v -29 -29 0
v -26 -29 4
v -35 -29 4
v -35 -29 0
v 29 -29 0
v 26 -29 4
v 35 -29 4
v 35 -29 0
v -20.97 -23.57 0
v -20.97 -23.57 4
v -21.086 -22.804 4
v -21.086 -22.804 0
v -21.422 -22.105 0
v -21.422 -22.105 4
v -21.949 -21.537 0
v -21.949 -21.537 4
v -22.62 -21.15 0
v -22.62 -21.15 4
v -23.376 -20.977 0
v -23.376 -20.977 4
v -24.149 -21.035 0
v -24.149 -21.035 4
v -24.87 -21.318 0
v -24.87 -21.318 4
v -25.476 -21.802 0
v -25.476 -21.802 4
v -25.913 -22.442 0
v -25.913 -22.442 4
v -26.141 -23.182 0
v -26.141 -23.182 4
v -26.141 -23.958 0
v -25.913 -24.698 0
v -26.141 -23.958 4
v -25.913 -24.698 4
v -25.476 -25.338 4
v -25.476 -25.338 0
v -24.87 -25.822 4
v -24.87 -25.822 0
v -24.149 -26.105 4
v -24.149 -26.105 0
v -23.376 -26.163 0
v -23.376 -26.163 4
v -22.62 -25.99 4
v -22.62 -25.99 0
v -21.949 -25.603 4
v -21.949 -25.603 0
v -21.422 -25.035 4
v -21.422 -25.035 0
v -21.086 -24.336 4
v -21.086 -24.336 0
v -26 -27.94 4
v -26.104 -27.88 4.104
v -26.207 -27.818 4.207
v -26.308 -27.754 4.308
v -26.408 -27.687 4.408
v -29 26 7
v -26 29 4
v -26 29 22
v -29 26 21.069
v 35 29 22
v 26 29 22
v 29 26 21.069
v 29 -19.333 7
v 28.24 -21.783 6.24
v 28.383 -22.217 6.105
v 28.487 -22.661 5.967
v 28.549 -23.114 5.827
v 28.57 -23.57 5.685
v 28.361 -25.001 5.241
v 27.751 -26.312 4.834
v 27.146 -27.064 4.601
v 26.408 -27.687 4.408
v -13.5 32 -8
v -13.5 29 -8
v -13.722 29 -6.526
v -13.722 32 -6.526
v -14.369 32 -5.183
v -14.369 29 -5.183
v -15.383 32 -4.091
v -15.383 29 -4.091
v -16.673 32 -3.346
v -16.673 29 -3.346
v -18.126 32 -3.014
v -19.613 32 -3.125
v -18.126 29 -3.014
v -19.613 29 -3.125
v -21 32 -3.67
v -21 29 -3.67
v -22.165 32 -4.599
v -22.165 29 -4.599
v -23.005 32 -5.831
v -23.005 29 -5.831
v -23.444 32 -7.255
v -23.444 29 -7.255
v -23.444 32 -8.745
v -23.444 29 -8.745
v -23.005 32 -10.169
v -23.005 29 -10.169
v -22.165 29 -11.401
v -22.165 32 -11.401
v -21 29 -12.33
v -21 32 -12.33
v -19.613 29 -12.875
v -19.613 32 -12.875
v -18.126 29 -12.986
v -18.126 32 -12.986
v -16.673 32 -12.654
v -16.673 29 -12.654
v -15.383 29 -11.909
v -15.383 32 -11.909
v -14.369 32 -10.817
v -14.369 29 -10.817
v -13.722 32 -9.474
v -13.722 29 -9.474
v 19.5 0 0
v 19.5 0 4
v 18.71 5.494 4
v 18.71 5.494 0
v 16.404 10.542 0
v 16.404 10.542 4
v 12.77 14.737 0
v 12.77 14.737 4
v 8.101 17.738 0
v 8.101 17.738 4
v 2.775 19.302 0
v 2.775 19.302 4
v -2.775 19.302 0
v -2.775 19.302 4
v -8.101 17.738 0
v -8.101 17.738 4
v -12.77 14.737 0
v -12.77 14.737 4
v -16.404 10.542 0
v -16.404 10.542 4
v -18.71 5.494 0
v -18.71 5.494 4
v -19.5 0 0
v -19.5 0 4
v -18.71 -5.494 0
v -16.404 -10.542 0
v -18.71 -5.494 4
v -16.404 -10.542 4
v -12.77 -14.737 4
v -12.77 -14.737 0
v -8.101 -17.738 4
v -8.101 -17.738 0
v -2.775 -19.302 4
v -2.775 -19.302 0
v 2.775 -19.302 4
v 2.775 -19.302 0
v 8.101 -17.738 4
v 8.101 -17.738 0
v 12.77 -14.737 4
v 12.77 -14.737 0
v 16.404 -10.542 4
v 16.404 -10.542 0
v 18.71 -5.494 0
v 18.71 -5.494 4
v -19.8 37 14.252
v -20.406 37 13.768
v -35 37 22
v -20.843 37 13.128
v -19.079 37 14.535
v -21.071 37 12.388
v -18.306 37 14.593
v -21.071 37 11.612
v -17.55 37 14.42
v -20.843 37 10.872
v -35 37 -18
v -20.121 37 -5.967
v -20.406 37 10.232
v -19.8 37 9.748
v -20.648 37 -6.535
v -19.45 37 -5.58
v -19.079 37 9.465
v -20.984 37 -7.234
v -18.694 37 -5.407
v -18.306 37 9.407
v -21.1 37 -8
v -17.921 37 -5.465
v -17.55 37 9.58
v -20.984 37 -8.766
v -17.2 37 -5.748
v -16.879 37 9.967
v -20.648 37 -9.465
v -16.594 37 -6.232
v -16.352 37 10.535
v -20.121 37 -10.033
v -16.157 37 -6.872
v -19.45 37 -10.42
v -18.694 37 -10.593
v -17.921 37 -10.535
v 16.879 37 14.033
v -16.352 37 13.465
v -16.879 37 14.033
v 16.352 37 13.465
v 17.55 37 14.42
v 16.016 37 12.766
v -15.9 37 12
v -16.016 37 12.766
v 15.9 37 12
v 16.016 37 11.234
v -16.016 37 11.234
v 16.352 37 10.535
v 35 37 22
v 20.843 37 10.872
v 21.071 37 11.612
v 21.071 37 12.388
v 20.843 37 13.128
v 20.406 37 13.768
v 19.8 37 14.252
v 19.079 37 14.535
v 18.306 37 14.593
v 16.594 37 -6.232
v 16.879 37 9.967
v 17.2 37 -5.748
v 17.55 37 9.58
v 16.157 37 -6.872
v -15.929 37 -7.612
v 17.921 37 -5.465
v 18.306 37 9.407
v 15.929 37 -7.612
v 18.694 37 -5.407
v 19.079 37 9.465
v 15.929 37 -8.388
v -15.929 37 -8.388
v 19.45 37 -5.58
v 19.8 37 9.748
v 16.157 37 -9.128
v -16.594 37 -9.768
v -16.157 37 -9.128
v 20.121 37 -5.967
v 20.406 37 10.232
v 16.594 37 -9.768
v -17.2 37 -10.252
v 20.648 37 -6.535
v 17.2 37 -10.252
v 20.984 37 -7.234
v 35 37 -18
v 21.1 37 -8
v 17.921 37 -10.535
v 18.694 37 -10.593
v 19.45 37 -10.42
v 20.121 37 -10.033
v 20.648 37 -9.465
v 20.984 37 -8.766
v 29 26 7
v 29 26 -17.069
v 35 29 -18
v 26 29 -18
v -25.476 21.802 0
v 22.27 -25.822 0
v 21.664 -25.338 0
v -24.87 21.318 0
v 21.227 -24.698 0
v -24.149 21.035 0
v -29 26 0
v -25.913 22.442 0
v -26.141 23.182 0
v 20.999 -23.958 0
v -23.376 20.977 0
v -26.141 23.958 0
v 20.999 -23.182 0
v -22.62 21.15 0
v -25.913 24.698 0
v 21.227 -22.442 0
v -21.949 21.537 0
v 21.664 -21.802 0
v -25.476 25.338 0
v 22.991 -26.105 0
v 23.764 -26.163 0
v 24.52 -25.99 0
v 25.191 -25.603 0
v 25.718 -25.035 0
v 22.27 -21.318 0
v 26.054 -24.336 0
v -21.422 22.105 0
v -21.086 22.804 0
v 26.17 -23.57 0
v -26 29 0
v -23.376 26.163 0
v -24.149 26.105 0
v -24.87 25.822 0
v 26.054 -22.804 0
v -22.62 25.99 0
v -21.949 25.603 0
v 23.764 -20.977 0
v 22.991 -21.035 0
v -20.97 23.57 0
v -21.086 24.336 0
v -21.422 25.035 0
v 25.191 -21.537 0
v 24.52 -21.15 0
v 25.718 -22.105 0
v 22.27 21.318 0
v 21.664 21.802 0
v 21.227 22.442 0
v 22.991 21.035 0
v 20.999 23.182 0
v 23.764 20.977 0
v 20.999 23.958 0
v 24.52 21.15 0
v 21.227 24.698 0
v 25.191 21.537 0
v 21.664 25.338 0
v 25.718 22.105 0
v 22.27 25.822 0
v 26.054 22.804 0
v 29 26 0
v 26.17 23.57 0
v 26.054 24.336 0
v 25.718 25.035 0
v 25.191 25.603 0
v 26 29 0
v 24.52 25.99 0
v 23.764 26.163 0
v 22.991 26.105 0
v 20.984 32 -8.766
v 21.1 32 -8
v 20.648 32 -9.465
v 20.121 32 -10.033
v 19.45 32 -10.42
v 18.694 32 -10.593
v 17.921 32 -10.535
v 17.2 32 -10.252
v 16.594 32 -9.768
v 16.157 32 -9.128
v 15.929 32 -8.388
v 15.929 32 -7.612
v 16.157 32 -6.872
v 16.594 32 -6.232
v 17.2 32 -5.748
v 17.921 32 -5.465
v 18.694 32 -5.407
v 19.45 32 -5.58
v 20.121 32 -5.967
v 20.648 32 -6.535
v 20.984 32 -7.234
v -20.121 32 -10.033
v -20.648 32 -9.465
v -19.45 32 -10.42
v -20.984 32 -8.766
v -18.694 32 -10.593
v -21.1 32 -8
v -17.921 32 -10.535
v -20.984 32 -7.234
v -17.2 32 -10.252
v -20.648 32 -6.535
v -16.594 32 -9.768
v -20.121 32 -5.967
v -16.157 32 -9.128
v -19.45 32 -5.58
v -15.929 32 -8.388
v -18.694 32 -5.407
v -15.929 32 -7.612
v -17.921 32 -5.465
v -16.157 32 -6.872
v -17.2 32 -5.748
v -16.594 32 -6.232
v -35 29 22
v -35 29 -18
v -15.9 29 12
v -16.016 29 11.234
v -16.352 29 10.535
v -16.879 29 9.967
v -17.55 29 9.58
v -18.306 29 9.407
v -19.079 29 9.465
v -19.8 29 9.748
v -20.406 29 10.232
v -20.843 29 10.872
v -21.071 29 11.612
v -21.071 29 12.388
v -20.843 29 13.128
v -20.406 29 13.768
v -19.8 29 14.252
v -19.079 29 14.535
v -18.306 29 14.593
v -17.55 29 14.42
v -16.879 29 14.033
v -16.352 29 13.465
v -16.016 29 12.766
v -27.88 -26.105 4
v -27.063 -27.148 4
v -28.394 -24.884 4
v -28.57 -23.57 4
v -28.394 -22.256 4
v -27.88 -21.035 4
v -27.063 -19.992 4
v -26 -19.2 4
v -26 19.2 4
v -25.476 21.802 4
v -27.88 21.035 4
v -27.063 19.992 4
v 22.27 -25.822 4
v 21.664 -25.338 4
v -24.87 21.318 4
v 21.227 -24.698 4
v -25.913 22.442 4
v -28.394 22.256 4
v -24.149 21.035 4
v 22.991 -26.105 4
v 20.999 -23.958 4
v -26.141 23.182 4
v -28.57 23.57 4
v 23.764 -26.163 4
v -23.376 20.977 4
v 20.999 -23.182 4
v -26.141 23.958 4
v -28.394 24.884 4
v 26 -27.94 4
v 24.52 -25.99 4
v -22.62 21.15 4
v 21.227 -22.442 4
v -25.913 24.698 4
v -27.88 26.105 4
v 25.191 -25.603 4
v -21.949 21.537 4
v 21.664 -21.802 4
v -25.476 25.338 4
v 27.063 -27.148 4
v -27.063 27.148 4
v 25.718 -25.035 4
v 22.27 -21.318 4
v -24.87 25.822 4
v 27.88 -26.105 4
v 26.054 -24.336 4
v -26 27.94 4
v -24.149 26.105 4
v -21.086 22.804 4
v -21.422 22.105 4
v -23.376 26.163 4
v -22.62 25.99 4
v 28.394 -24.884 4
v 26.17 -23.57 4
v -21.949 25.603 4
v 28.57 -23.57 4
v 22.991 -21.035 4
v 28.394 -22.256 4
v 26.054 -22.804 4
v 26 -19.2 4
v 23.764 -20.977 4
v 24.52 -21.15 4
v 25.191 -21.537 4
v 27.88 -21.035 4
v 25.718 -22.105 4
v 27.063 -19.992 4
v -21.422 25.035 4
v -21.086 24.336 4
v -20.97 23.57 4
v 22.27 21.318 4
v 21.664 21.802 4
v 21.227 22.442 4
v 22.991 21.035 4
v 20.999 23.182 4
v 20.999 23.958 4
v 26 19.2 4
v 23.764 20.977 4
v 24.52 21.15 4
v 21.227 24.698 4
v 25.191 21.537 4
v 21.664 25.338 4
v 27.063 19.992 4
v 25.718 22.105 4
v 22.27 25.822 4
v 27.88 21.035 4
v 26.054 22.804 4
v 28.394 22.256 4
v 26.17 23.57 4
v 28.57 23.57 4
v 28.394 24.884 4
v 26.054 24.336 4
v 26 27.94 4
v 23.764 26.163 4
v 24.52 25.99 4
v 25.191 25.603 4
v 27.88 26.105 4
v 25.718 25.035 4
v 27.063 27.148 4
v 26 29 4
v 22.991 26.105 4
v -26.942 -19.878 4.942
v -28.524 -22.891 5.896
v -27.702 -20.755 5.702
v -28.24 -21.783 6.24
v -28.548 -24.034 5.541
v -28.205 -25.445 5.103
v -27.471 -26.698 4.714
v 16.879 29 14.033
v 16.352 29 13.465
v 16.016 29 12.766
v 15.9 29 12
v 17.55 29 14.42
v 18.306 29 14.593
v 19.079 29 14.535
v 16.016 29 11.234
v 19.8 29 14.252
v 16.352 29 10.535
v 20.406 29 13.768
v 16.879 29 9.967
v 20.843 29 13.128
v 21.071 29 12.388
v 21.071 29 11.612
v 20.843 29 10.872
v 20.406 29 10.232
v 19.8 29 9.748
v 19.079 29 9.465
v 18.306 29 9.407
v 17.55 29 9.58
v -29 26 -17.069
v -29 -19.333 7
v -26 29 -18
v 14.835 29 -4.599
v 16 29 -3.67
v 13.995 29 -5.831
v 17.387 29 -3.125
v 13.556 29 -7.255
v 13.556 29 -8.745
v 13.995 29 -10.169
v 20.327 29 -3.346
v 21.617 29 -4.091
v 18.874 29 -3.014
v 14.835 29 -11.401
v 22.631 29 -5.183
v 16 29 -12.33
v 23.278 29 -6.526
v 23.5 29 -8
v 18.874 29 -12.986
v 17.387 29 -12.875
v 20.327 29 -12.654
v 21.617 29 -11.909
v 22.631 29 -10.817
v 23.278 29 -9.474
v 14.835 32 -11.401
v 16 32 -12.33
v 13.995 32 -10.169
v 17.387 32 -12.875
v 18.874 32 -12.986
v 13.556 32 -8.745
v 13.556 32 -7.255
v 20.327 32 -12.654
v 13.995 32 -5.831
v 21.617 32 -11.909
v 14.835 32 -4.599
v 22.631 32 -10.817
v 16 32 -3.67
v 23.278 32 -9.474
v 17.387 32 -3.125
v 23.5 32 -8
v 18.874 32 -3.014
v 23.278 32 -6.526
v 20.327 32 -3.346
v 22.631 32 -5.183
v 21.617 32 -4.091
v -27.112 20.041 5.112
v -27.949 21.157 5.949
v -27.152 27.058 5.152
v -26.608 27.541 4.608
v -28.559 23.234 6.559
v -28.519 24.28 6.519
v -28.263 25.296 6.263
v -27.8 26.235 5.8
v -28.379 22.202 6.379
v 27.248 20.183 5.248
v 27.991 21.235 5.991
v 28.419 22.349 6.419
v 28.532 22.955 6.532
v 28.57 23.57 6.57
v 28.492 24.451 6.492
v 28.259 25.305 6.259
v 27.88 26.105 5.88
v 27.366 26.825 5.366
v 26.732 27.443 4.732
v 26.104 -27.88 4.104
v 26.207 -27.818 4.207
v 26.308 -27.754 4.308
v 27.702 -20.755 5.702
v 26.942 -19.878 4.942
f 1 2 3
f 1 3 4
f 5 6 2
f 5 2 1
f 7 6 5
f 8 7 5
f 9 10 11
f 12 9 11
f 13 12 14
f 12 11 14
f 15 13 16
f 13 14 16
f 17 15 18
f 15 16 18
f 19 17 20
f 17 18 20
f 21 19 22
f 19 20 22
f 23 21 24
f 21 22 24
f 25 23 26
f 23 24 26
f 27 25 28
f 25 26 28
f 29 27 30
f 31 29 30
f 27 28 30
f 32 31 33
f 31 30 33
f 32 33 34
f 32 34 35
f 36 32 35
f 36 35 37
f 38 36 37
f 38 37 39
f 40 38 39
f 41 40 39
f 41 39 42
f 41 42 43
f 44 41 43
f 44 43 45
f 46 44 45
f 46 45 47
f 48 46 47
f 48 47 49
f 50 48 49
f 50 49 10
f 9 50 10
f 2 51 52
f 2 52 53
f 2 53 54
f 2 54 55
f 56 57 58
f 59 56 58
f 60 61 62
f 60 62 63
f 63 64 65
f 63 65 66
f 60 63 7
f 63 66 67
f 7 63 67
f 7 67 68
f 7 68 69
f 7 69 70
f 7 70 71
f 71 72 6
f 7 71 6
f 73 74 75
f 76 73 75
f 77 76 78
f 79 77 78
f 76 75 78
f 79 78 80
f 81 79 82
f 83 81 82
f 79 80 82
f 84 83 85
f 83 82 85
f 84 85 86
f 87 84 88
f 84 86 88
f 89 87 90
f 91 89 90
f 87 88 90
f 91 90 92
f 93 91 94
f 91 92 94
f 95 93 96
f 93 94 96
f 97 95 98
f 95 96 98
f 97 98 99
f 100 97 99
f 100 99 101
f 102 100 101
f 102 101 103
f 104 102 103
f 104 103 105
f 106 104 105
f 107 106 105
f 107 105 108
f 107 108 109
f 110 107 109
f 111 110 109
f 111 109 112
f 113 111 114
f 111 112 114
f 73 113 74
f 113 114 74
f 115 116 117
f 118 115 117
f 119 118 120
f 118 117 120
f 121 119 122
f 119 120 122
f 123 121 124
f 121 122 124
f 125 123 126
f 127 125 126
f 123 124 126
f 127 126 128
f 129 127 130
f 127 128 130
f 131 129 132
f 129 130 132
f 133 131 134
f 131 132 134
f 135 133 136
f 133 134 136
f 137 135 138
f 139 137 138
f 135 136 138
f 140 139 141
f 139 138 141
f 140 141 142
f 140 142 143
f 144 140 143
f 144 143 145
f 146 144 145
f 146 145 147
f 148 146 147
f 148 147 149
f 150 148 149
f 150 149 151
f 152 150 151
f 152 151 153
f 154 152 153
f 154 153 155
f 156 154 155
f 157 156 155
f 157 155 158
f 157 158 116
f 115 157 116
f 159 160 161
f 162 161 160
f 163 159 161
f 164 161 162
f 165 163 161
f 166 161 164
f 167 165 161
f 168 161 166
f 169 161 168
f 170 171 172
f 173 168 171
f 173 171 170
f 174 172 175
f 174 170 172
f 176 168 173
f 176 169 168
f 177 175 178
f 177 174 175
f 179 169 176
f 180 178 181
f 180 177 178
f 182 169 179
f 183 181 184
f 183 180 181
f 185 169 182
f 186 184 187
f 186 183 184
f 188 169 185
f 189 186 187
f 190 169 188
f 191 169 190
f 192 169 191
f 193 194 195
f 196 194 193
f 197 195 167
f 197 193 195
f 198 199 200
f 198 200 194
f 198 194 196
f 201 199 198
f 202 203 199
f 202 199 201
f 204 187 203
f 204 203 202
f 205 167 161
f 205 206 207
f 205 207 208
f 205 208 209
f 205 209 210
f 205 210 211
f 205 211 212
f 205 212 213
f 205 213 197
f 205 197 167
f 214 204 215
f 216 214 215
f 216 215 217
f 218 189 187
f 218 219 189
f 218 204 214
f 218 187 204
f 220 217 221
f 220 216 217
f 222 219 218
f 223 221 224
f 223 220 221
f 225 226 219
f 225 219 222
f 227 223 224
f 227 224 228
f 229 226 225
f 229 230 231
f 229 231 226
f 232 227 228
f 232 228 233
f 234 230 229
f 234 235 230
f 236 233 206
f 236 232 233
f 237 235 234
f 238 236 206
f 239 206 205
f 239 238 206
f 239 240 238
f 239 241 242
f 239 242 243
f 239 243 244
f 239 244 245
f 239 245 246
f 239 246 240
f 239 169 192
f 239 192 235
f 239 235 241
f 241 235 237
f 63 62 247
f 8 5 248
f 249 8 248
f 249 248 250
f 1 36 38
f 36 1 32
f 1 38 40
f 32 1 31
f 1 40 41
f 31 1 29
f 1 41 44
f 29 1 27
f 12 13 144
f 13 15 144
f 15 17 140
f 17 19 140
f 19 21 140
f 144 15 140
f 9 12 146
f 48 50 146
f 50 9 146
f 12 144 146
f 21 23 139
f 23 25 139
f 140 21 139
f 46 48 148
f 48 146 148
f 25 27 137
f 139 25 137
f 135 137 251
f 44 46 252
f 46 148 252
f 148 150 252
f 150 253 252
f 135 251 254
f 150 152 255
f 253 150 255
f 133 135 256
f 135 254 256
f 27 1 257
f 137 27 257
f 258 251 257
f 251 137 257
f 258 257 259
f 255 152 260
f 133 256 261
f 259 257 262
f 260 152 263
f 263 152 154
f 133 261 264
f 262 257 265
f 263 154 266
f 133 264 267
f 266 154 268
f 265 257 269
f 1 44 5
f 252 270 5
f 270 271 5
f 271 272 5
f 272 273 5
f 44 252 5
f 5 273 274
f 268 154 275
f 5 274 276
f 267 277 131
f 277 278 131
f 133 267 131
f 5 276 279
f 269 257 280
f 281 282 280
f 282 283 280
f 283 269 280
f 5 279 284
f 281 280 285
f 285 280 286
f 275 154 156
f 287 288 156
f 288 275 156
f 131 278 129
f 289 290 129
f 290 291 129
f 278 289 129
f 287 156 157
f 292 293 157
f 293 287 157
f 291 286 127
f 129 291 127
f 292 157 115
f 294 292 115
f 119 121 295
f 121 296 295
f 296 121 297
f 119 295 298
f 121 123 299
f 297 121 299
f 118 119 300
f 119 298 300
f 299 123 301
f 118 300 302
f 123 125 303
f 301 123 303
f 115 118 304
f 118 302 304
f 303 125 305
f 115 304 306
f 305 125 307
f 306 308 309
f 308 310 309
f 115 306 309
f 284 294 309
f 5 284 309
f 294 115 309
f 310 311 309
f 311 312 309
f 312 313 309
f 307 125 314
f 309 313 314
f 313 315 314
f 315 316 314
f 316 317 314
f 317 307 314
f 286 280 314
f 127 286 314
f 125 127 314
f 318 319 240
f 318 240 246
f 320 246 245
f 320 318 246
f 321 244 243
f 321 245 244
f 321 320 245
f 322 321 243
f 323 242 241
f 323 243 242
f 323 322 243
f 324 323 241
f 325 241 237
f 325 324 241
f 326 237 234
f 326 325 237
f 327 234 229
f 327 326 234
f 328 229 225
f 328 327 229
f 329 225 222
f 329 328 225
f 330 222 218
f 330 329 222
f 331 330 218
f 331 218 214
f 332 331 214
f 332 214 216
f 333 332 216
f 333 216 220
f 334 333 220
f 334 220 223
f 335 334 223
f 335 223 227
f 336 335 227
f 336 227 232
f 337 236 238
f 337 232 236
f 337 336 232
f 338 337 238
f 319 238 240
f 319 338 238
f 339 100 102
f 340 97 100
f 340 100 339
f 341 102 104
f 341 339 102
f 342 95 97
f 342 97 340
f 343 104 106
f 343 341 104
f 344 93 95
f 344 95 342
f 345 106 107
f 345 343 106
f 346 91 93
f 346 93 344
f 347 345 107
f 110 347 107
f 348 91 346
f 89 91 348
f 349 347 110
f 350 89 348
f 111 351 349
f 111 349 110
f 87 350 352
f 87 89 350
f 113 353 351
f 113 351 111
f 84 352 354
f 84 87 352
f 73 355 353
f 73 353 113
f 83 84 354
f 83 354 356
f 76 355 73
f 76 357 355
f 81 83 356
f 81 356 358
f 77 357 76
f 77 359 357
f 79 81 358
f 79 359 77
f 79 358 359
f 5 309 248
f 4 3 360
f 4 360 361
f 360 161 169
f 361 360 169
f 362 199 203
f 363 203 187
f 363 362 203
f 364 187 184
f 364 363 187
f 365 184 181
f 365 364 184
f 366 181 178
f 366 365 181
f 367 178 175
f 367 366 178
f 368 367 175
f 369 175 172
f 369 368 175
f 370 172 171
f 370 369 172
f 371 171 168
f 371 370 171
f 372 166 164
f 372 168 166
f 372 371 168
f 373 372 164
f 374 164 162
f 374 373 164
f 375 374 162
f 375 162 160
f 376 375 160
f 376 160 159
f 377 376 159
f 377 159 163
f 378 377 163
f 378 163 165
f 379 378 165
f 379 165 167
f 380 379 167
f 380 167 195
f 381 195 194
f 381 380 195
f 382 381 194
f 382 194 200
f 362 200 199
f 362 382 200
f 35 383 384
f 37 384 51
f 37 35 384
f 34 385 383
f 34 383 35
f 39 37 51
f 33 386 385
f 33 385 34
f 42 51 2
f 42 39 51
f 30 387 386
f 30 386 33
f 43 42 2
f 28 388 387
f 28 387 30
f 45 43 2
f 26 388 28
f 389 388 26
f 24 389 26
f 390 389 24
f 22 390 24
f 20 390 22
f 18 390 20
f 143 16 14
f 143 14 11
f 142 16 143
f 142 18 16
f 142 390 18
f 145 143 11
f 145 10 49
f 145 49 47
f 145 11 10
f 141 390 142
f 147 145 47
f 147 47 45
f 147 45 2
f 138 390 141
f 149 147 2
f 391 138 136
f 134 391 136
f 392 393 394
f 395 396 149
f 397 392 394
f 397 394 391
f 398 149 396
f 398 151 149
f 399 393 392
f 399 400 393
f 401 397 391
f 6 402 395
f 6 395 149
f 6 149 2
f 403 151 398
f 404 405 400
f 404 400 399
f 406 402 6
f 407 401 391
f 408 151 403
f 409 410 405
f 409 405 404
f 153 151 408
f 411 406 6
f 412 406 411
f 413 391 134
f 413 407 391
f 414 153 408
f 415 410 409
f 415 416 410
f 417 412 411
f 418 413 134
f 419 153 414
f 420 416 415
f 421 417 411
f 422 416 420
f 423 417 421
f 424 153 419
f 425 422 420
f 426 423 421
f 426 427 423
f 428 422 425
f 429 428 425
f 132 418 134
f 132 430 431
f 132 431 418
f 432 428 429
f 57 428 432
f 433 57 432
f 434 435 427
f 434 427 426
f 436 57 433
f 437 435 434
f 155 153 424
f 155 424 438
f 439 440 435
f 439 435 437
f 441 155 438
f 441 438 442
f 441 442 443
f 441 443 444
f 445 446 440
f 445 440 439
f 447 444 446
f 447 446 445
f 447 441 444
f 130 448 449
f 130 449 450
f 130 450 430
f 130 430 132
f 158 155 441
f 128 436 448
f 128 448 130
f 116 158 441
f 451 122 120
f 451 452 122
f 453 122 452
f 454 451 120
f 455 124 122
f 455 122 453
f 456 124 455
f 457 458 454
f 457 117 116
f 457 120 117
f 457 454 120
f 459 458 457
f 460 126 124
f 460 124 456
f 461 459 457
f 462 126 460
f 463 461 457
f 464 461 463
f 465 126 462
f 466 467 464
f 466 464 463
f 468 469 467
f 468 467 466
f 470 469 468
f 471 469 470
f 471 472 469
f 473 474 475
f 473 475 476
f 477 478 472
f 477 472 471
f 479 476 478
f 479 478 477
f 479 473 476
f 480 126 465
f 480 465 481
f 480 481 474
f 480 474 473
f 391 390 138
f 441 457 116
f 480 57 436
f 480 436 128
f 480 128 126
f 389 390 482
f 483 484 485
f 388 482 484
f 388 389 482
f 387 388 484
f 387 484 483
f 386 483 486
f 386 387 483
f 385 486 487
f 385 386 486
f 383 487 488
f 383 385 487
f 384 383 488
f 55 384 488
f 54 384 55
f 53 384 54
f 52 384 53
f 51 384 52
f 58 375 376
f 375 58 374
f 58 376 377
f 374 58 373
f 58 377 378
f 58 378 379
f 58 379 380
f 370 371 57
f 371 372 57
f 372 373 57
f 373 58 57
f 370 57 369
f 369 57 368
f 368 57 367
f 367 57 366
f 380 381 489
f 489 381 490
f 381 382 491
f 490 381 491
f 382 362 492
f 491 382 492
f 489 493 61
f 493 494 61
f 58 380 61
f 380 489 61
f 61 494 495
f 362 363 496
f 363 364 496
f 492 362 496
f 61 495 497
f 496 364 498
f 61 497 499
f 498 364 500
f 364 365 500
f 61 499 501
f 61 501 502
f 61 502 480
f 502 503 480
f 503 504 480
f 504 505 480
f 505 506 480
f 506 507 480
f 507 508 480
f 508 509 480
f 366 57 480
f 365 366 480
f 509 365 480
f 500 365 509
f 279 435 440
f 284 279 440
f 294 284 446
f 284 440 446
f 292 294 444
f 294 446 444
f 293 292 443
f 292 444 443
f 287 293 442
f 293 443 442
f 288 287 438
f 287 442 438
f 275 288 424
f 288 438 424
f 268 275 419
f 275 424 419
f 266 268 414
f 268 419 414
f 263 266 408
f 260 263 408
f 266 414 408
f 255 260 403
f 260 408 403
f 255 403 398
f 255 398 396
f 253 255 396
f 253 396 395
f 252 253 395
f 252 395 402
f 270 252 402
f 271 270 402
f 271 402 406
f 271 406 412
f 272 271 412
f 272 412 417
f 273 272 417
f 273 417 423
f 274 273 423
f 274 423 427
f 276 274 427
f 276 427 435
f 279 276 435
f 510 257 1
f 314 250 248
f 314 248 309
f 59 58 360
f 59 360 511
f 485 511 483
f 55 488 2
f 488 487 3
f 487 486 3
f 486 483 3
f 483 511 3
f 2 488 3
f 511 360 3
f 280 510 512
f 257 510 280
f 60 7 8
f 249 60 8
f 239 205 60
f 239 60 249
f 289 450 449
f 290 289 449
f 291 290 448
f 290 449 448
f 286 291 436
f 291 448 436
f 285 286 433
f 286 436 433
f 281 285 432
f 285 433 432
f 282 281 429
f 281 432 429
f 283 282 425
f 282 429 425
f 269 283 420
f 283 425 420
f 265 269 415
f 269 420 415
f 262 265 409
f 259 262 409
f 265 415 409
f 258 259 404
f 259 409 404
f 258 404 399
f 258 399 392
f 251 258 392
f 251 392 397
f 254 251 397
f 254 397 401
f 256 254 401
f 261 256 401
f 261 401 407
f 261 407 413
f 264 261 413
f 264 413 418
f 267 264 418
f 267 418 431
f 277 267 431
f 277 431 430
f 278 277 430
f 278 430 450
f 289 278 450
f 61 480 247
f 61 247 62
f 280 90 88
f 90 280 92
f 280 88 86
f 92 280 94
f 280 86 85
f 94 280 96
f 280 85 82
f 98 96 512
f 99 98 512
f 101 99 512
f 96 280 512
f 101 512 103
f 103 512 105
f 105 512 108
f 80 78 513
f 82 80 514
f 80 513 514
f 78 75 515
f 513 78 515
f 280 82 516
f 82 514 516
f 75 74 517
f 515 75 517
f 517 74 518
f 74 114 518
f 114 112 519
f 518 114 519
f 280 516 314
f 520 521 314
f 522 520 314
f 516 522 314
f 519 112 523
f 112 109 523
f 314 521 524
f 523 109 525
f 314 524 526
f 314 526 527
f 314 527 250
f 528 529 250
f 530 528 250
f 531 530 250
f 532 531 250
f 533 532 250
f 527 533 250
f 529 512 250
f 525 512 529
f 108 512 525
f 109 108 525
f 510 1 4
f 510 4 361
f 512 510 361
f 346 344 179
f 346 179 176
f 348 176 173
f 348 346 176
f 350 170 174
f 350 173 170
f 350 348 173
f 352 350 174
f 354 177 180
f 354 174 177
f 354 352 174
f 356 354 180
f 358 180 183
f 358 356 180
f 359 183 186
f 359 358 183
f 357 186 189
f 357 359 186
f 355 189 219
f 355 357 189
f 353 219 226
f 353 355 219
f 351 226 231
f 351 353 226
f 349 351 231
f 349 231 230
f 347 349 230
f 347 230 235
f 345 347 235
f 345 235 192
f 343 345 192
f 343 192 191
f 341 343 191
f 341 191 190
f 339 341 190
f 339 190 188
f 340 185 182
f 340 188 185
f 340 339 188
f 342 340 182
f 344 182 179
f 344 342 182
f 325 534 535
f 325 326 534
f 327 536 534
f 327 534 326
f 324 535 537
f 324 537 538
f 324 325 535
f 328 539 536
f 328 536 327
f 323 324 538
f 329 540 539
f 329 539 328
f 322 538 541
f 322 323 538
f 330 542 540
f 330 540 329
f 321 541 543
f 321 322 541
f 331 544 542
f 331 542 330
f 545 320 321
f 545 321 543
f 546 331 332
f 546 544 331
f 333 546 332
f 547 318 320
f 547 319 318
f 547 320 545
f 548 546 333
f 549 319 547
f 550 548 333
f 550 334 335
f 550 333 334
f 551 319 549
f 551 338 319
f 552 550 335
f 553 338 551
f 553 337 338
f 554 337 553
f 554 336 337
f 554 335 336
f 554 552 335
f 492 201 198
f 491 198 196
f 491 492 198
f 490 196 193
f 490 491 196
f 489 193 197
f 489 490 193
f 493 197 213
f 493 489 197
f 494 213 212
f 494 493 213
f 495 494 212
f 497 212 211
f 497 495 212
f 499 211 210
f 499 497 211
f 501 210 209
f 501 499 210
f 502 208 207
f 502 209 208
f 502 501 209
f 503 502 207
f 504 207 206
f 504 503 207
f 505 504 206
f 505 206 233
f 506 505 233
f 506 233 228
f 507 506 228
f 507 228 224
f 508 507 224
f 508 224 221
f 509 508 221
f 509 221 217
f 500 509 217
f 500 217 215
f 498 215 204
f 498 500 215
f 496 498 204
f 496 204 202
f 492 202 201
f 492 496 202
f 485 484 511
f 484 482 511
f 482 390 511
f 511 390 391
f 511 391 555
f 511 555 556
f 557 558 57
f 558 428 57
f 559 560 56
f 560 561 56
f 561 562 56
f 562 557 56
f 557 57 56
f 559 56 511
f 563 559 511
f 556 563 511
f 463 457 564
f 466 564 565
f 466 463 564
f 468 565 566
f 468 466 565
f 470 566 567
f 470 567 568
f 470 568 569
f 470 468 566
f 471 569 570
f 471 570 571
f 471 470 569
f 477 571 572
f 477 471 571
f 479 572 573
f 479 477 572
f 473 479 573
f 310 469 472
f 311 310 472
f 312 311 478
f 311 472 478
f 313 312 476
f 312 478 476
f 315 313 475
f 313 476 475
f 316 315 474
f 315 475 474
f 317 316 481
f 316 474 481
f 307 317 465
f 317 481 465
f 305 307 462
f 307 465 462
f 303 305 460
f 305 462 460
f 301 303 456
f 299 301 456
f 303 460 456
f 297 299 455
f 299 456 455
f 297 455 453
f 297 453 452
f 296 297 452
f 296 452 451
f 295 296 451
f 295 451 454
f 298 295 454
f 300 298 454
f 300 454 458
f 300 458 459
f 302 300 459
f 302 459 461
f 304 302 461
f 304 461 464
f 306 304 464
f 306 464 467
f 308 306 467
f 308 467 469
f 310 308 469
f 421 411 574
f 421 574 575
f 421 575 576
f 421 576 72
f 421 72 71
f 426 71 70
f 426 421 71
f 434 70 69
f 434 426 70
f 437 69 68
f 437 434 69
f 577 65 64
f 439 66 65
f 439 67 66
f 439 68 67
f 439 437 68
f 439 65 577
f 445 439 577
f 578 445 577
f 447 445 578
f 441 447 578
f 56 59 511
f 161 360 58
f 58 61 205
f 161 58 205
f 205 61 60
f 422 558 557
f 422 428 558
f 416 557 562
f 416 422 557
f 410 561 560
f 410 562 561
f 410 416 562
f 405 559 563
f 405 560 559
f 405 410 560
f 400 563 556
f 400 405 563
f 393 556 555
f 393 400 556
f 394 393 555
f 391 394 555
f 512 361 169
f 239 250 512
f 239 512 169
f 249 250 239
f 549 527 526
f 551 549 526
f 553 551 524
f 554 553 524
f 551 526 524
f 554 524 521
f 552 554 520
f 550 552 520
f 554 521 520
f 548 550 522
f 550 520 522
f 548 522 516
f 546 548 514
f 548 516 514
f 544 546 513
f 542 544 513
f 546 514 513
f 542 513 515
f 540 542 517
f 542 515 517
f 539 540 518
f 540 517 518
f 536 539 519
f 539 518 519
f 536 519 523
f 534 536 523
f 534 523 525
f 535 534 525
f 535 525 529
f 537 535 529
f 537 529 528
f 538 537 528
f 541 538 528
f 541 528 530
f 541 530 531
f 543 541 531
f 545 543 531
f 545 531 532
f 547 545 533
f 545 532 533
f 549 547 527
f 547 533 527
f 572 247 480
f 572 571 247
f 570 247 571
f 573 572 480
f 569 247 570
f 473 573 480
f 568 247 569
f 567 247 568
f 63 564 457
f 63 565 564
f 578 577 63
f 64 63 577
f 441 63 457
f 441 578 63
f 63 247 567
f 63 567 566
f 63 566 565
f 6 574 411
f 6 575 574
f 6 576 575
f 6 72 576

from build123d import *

# Parameters (mm, degrees)
SKETCH_1_W          = 58
SKETCH_1_H          = 58
EXTRUDE_1_DEPTH     = 4
SKETCH_6_R          = 19.5
SKETCH_6_R_2        = 2.6
CUT_EXTRUDE_1_DEPTH = 42.206795556
SKETCH_3_W          = 70
SKETCH_3_H          = 40
EXTRUDE_2_DEPTH     = 8
EXTRUDE_3_DEPTH     = 6
SKETCH_8_R          = 2.6
CUT_EXTRUDE_2_DEPTH = 72.224995612
SKETCH_9_R          = 5
CUT_EXTRUDE_3_DEPTH = 3
CHAMFER_2_SIZE      = 3
CHAMFER_1_SIZE      = 3
SKETCH_11_R         = 5
CUT_EXTRUDE_4_DEPTH = 56.479726027


with BuildPart() as part:
    # Эскиз1 → Бобышка-Вытянуть1 (new body)
    with BuildSketch(Plane.XY):
        Rectangle(SKETCH_1_W, SKETCH_1_H)
    extrude(amount=EXTRUDE_1_DEPTH)

    # Эскиз6 → Вырез-Вытянуть1 (cut, through all)
    with BuildSketch(Plane.XY.offset(4)):
        Circle(SKETCH_6_R)
        with Locations((-23.57, 23.57)):
            Circle(SKETCH_6_R_2)
        with Locations((23.57, 23.57)):
            Circle(SKETCH_6_R_2)
        with Locations((-23.57, -23.57)):
            Circle(SKETCH_6_R_2)
        with Locations((23.57, -23.57)):
            Circle(SKETCH_6_R_2)
    extrude(amount=-CUT_EXTRUDE_1_DEPTH, mode=Mode.SUBTRACT)

    # Эскиз3 → Бобышка-Вытянуть2 (add)
    with BuildSketch(Plane(origin=(0, 29, 0), x_dir=(1, 0, 0), z_dir=(0, 1, 0))):
        with Locations((0, -2)):
            Rectangle(SKETCH_3_W, SKETCH_3_H)
    extrude(amount=EXTRUDE_2_DEPTH)

    # Эскиз5 → Бобышка-Вытянуть3 (add)
    with BuildSketch(Plane(origin=(29, 0, 0), x_dir=(0, 0, -1), z_dir=(1, 0, 0))):
        Polygon((-4, -29), (0, -29), (18, 29), (-22, 29), align=None)
    extrude_3 = extrude(amount=EXTRUDE_3_DEPTH)

    # Зеркальное отражение3: Бобышка-Вытянуть3 across plane
    add(extrude_3.mirror(Plane(origin=(0, 0, 0), x_dir=(0, 0, 1), z_dir=(1, 0, 0))))

    # Эскиз8 → Вырез-Вытянуть2 (cut, through all)
    with BuildSketch(Plane(origin=(0, 29, 0), x_dir=(1, 0, 0), z_dir=(0, 1, 0))):
        with Locations((18.5, 8)):
            Circle(SKETCH_8_R)
        with Locations(Location((-18.5, 8, 0), (0, 0, 180))):
            Circle(SKETCH_8_R)
        with Locations(Location((18.5, -12, 0), (0, 0, 180))):
            Circle(SKETCH_8_R)
        with Locations((-18.5, -12)):
            Circle(SKETCH_8_R)
    extrude(amount=CUT_EXTRUDE_2_DEPTH, mode=Mode.SUBTRACT)

    # Эскиз9 → Вырез-Вытянуть3 (cut)
    with BuildSketch(Plane.XZ.offset(-29)):
        with Locations((-18.5, -8)):
            Circle(SKETCH_9_R)
        with Locations((18.5, -8)):
            Circle(SKETCH_9_R)
    extrude(amount=-CUT_EXTRUDE_3_DEPTH, mode=Mode.SUBTRACT)

    # Фаска2
    # the kernel refuses this chamfer: 3 mm, written as the material it adds along each edge
    with BuildSketch(Plane(origin=(29, -29, 4), x_dir=(0.027495876610586775, 0, 0.9996219169112968), z_dir=(0, 1, 0))) as chamfer_2_piece_1_section:
        Polygon((CHAMFER_2_SIZE * 0.999621916911, -CHAMFER_2_SIZE * 0.0274958766106), (-CHAMFER_2_SIZE * 0.0274958766106, -CHAMFER_2_SIZE * 0.999621916911), (0, 0), align=None)
    chamfer_2_piece_1 = extrude(amount=65.715048964, mode=Mode.PRIVATE)
    chamfer_2_piece_1 = split(chamfer_2_piece_1, bisect_by=Plane(origin=(27.993637715, -0.868614474, 12.730429991), z_dir=(0, 0.2963992148724529, -0.9550641368112371)), keep=Keep.TOP, mode=Mode.PRIVATE)
    chamfer_2_piece_1 = chamfer_2_piece_1 - Plane(origin=(23.57, -23.57, 4.956337432), x_dir=(1, 0, 0), z_dir=(0, 0, 1)) * Cylinder(2.6, 144, mode=Mode.PRIVATE)
    chamfer_2_piece_1 = chamfer_2_piece_1 - Plane(origin=(23.57, 23.57, 4.956337432), x_dir=(1, 0, 0), z_dir=(0, 0, 1)) * Cylinder(2.6, 144, mode=Mode.PRIVATE)
    add(chamfer_2_piece_1)
    with BuildSketch(Plane(origin=(-29, 36.715048964, 4), x_dir=(0.9996219169112968, 0, -0.027495876610586334), z_dir=(0, -1, 0))) as chamfer_2_piece_2_section:
        Polygon((CHAMFER_2_SIZE * 0.999621916911, CHAMFER_2_SIZE * 0.0274958766106), (-CHAMFER_2_SIZE * 0.0274958766106, CHAMFER_2_SIZE * 0.999621916911), (0, 0), align=None)
    chamfer_2_piece_2 = extrude(amount=65.715048964, mode=Mode.PRIVATE)
    chamfer_2_piece_2 = split(chamfer_2_piece_2, bisect_by=Plane(origin=(-28.01061912, 27.703260845, 21.597563711), z_dir=(0, 0.2963992148724529, -0.9550641368112371)), keep=Keep.TOP, mode=Mode.PRIVATE)
    chamfer_2_piece_2 = chamfer_2_piece_2 - Plane(origin=(-23.57, -23.57, 4.98938088), x_dir=(1, 0, 0), z_dir=(0, 0, 1)) * Cylinder(2.6, 144, mode=Mode.PRIVATE)
    chamfer_2_piece_2 = chamfer_2_piece_2 - Plane(origin=(-23.57, 23.57, 4.98938088), x_dir=(1, 0, 0), z_dir=(0, 0, 1)) * Cylinder(2.6, 144, mode=Mode.PRIVATE)
    add(chamfer_2_piece_2)

    # Фаска1
    chamfer_1_edges = [part.edges().sort_by_distance(p)[0] for p in [
        (-29, 29, 14.5),
        (29, 29, 14.5),
        (29, 29, -9),
        (-29, 29, -9),
    ]]
    chamfer(chamfer_1_edges, length=CHAMFER_1_SIZE)

    # Эскиз11 → Вырез-Вытянуть4 (cut, through all)
    with BuildSketch(Plane.XY.offset(4)):
        with Locations((-23.57, 23.57)):
            Circle(SKETCH_11_R)
        with Locations((23.57, 23.57)):
            Circle(SKETCH_11_R)
        with Locations((23.57, -23.57)):
            Circle(SKETCH_11_R)
        with Locations((-23.57, -23.57)):
            Circle(SKETCH_11_R)
    extrude(amount=CUT_EXTRUDE_4_DEPTH, mode=Mode.SUBTRACT)


solid = part.part
